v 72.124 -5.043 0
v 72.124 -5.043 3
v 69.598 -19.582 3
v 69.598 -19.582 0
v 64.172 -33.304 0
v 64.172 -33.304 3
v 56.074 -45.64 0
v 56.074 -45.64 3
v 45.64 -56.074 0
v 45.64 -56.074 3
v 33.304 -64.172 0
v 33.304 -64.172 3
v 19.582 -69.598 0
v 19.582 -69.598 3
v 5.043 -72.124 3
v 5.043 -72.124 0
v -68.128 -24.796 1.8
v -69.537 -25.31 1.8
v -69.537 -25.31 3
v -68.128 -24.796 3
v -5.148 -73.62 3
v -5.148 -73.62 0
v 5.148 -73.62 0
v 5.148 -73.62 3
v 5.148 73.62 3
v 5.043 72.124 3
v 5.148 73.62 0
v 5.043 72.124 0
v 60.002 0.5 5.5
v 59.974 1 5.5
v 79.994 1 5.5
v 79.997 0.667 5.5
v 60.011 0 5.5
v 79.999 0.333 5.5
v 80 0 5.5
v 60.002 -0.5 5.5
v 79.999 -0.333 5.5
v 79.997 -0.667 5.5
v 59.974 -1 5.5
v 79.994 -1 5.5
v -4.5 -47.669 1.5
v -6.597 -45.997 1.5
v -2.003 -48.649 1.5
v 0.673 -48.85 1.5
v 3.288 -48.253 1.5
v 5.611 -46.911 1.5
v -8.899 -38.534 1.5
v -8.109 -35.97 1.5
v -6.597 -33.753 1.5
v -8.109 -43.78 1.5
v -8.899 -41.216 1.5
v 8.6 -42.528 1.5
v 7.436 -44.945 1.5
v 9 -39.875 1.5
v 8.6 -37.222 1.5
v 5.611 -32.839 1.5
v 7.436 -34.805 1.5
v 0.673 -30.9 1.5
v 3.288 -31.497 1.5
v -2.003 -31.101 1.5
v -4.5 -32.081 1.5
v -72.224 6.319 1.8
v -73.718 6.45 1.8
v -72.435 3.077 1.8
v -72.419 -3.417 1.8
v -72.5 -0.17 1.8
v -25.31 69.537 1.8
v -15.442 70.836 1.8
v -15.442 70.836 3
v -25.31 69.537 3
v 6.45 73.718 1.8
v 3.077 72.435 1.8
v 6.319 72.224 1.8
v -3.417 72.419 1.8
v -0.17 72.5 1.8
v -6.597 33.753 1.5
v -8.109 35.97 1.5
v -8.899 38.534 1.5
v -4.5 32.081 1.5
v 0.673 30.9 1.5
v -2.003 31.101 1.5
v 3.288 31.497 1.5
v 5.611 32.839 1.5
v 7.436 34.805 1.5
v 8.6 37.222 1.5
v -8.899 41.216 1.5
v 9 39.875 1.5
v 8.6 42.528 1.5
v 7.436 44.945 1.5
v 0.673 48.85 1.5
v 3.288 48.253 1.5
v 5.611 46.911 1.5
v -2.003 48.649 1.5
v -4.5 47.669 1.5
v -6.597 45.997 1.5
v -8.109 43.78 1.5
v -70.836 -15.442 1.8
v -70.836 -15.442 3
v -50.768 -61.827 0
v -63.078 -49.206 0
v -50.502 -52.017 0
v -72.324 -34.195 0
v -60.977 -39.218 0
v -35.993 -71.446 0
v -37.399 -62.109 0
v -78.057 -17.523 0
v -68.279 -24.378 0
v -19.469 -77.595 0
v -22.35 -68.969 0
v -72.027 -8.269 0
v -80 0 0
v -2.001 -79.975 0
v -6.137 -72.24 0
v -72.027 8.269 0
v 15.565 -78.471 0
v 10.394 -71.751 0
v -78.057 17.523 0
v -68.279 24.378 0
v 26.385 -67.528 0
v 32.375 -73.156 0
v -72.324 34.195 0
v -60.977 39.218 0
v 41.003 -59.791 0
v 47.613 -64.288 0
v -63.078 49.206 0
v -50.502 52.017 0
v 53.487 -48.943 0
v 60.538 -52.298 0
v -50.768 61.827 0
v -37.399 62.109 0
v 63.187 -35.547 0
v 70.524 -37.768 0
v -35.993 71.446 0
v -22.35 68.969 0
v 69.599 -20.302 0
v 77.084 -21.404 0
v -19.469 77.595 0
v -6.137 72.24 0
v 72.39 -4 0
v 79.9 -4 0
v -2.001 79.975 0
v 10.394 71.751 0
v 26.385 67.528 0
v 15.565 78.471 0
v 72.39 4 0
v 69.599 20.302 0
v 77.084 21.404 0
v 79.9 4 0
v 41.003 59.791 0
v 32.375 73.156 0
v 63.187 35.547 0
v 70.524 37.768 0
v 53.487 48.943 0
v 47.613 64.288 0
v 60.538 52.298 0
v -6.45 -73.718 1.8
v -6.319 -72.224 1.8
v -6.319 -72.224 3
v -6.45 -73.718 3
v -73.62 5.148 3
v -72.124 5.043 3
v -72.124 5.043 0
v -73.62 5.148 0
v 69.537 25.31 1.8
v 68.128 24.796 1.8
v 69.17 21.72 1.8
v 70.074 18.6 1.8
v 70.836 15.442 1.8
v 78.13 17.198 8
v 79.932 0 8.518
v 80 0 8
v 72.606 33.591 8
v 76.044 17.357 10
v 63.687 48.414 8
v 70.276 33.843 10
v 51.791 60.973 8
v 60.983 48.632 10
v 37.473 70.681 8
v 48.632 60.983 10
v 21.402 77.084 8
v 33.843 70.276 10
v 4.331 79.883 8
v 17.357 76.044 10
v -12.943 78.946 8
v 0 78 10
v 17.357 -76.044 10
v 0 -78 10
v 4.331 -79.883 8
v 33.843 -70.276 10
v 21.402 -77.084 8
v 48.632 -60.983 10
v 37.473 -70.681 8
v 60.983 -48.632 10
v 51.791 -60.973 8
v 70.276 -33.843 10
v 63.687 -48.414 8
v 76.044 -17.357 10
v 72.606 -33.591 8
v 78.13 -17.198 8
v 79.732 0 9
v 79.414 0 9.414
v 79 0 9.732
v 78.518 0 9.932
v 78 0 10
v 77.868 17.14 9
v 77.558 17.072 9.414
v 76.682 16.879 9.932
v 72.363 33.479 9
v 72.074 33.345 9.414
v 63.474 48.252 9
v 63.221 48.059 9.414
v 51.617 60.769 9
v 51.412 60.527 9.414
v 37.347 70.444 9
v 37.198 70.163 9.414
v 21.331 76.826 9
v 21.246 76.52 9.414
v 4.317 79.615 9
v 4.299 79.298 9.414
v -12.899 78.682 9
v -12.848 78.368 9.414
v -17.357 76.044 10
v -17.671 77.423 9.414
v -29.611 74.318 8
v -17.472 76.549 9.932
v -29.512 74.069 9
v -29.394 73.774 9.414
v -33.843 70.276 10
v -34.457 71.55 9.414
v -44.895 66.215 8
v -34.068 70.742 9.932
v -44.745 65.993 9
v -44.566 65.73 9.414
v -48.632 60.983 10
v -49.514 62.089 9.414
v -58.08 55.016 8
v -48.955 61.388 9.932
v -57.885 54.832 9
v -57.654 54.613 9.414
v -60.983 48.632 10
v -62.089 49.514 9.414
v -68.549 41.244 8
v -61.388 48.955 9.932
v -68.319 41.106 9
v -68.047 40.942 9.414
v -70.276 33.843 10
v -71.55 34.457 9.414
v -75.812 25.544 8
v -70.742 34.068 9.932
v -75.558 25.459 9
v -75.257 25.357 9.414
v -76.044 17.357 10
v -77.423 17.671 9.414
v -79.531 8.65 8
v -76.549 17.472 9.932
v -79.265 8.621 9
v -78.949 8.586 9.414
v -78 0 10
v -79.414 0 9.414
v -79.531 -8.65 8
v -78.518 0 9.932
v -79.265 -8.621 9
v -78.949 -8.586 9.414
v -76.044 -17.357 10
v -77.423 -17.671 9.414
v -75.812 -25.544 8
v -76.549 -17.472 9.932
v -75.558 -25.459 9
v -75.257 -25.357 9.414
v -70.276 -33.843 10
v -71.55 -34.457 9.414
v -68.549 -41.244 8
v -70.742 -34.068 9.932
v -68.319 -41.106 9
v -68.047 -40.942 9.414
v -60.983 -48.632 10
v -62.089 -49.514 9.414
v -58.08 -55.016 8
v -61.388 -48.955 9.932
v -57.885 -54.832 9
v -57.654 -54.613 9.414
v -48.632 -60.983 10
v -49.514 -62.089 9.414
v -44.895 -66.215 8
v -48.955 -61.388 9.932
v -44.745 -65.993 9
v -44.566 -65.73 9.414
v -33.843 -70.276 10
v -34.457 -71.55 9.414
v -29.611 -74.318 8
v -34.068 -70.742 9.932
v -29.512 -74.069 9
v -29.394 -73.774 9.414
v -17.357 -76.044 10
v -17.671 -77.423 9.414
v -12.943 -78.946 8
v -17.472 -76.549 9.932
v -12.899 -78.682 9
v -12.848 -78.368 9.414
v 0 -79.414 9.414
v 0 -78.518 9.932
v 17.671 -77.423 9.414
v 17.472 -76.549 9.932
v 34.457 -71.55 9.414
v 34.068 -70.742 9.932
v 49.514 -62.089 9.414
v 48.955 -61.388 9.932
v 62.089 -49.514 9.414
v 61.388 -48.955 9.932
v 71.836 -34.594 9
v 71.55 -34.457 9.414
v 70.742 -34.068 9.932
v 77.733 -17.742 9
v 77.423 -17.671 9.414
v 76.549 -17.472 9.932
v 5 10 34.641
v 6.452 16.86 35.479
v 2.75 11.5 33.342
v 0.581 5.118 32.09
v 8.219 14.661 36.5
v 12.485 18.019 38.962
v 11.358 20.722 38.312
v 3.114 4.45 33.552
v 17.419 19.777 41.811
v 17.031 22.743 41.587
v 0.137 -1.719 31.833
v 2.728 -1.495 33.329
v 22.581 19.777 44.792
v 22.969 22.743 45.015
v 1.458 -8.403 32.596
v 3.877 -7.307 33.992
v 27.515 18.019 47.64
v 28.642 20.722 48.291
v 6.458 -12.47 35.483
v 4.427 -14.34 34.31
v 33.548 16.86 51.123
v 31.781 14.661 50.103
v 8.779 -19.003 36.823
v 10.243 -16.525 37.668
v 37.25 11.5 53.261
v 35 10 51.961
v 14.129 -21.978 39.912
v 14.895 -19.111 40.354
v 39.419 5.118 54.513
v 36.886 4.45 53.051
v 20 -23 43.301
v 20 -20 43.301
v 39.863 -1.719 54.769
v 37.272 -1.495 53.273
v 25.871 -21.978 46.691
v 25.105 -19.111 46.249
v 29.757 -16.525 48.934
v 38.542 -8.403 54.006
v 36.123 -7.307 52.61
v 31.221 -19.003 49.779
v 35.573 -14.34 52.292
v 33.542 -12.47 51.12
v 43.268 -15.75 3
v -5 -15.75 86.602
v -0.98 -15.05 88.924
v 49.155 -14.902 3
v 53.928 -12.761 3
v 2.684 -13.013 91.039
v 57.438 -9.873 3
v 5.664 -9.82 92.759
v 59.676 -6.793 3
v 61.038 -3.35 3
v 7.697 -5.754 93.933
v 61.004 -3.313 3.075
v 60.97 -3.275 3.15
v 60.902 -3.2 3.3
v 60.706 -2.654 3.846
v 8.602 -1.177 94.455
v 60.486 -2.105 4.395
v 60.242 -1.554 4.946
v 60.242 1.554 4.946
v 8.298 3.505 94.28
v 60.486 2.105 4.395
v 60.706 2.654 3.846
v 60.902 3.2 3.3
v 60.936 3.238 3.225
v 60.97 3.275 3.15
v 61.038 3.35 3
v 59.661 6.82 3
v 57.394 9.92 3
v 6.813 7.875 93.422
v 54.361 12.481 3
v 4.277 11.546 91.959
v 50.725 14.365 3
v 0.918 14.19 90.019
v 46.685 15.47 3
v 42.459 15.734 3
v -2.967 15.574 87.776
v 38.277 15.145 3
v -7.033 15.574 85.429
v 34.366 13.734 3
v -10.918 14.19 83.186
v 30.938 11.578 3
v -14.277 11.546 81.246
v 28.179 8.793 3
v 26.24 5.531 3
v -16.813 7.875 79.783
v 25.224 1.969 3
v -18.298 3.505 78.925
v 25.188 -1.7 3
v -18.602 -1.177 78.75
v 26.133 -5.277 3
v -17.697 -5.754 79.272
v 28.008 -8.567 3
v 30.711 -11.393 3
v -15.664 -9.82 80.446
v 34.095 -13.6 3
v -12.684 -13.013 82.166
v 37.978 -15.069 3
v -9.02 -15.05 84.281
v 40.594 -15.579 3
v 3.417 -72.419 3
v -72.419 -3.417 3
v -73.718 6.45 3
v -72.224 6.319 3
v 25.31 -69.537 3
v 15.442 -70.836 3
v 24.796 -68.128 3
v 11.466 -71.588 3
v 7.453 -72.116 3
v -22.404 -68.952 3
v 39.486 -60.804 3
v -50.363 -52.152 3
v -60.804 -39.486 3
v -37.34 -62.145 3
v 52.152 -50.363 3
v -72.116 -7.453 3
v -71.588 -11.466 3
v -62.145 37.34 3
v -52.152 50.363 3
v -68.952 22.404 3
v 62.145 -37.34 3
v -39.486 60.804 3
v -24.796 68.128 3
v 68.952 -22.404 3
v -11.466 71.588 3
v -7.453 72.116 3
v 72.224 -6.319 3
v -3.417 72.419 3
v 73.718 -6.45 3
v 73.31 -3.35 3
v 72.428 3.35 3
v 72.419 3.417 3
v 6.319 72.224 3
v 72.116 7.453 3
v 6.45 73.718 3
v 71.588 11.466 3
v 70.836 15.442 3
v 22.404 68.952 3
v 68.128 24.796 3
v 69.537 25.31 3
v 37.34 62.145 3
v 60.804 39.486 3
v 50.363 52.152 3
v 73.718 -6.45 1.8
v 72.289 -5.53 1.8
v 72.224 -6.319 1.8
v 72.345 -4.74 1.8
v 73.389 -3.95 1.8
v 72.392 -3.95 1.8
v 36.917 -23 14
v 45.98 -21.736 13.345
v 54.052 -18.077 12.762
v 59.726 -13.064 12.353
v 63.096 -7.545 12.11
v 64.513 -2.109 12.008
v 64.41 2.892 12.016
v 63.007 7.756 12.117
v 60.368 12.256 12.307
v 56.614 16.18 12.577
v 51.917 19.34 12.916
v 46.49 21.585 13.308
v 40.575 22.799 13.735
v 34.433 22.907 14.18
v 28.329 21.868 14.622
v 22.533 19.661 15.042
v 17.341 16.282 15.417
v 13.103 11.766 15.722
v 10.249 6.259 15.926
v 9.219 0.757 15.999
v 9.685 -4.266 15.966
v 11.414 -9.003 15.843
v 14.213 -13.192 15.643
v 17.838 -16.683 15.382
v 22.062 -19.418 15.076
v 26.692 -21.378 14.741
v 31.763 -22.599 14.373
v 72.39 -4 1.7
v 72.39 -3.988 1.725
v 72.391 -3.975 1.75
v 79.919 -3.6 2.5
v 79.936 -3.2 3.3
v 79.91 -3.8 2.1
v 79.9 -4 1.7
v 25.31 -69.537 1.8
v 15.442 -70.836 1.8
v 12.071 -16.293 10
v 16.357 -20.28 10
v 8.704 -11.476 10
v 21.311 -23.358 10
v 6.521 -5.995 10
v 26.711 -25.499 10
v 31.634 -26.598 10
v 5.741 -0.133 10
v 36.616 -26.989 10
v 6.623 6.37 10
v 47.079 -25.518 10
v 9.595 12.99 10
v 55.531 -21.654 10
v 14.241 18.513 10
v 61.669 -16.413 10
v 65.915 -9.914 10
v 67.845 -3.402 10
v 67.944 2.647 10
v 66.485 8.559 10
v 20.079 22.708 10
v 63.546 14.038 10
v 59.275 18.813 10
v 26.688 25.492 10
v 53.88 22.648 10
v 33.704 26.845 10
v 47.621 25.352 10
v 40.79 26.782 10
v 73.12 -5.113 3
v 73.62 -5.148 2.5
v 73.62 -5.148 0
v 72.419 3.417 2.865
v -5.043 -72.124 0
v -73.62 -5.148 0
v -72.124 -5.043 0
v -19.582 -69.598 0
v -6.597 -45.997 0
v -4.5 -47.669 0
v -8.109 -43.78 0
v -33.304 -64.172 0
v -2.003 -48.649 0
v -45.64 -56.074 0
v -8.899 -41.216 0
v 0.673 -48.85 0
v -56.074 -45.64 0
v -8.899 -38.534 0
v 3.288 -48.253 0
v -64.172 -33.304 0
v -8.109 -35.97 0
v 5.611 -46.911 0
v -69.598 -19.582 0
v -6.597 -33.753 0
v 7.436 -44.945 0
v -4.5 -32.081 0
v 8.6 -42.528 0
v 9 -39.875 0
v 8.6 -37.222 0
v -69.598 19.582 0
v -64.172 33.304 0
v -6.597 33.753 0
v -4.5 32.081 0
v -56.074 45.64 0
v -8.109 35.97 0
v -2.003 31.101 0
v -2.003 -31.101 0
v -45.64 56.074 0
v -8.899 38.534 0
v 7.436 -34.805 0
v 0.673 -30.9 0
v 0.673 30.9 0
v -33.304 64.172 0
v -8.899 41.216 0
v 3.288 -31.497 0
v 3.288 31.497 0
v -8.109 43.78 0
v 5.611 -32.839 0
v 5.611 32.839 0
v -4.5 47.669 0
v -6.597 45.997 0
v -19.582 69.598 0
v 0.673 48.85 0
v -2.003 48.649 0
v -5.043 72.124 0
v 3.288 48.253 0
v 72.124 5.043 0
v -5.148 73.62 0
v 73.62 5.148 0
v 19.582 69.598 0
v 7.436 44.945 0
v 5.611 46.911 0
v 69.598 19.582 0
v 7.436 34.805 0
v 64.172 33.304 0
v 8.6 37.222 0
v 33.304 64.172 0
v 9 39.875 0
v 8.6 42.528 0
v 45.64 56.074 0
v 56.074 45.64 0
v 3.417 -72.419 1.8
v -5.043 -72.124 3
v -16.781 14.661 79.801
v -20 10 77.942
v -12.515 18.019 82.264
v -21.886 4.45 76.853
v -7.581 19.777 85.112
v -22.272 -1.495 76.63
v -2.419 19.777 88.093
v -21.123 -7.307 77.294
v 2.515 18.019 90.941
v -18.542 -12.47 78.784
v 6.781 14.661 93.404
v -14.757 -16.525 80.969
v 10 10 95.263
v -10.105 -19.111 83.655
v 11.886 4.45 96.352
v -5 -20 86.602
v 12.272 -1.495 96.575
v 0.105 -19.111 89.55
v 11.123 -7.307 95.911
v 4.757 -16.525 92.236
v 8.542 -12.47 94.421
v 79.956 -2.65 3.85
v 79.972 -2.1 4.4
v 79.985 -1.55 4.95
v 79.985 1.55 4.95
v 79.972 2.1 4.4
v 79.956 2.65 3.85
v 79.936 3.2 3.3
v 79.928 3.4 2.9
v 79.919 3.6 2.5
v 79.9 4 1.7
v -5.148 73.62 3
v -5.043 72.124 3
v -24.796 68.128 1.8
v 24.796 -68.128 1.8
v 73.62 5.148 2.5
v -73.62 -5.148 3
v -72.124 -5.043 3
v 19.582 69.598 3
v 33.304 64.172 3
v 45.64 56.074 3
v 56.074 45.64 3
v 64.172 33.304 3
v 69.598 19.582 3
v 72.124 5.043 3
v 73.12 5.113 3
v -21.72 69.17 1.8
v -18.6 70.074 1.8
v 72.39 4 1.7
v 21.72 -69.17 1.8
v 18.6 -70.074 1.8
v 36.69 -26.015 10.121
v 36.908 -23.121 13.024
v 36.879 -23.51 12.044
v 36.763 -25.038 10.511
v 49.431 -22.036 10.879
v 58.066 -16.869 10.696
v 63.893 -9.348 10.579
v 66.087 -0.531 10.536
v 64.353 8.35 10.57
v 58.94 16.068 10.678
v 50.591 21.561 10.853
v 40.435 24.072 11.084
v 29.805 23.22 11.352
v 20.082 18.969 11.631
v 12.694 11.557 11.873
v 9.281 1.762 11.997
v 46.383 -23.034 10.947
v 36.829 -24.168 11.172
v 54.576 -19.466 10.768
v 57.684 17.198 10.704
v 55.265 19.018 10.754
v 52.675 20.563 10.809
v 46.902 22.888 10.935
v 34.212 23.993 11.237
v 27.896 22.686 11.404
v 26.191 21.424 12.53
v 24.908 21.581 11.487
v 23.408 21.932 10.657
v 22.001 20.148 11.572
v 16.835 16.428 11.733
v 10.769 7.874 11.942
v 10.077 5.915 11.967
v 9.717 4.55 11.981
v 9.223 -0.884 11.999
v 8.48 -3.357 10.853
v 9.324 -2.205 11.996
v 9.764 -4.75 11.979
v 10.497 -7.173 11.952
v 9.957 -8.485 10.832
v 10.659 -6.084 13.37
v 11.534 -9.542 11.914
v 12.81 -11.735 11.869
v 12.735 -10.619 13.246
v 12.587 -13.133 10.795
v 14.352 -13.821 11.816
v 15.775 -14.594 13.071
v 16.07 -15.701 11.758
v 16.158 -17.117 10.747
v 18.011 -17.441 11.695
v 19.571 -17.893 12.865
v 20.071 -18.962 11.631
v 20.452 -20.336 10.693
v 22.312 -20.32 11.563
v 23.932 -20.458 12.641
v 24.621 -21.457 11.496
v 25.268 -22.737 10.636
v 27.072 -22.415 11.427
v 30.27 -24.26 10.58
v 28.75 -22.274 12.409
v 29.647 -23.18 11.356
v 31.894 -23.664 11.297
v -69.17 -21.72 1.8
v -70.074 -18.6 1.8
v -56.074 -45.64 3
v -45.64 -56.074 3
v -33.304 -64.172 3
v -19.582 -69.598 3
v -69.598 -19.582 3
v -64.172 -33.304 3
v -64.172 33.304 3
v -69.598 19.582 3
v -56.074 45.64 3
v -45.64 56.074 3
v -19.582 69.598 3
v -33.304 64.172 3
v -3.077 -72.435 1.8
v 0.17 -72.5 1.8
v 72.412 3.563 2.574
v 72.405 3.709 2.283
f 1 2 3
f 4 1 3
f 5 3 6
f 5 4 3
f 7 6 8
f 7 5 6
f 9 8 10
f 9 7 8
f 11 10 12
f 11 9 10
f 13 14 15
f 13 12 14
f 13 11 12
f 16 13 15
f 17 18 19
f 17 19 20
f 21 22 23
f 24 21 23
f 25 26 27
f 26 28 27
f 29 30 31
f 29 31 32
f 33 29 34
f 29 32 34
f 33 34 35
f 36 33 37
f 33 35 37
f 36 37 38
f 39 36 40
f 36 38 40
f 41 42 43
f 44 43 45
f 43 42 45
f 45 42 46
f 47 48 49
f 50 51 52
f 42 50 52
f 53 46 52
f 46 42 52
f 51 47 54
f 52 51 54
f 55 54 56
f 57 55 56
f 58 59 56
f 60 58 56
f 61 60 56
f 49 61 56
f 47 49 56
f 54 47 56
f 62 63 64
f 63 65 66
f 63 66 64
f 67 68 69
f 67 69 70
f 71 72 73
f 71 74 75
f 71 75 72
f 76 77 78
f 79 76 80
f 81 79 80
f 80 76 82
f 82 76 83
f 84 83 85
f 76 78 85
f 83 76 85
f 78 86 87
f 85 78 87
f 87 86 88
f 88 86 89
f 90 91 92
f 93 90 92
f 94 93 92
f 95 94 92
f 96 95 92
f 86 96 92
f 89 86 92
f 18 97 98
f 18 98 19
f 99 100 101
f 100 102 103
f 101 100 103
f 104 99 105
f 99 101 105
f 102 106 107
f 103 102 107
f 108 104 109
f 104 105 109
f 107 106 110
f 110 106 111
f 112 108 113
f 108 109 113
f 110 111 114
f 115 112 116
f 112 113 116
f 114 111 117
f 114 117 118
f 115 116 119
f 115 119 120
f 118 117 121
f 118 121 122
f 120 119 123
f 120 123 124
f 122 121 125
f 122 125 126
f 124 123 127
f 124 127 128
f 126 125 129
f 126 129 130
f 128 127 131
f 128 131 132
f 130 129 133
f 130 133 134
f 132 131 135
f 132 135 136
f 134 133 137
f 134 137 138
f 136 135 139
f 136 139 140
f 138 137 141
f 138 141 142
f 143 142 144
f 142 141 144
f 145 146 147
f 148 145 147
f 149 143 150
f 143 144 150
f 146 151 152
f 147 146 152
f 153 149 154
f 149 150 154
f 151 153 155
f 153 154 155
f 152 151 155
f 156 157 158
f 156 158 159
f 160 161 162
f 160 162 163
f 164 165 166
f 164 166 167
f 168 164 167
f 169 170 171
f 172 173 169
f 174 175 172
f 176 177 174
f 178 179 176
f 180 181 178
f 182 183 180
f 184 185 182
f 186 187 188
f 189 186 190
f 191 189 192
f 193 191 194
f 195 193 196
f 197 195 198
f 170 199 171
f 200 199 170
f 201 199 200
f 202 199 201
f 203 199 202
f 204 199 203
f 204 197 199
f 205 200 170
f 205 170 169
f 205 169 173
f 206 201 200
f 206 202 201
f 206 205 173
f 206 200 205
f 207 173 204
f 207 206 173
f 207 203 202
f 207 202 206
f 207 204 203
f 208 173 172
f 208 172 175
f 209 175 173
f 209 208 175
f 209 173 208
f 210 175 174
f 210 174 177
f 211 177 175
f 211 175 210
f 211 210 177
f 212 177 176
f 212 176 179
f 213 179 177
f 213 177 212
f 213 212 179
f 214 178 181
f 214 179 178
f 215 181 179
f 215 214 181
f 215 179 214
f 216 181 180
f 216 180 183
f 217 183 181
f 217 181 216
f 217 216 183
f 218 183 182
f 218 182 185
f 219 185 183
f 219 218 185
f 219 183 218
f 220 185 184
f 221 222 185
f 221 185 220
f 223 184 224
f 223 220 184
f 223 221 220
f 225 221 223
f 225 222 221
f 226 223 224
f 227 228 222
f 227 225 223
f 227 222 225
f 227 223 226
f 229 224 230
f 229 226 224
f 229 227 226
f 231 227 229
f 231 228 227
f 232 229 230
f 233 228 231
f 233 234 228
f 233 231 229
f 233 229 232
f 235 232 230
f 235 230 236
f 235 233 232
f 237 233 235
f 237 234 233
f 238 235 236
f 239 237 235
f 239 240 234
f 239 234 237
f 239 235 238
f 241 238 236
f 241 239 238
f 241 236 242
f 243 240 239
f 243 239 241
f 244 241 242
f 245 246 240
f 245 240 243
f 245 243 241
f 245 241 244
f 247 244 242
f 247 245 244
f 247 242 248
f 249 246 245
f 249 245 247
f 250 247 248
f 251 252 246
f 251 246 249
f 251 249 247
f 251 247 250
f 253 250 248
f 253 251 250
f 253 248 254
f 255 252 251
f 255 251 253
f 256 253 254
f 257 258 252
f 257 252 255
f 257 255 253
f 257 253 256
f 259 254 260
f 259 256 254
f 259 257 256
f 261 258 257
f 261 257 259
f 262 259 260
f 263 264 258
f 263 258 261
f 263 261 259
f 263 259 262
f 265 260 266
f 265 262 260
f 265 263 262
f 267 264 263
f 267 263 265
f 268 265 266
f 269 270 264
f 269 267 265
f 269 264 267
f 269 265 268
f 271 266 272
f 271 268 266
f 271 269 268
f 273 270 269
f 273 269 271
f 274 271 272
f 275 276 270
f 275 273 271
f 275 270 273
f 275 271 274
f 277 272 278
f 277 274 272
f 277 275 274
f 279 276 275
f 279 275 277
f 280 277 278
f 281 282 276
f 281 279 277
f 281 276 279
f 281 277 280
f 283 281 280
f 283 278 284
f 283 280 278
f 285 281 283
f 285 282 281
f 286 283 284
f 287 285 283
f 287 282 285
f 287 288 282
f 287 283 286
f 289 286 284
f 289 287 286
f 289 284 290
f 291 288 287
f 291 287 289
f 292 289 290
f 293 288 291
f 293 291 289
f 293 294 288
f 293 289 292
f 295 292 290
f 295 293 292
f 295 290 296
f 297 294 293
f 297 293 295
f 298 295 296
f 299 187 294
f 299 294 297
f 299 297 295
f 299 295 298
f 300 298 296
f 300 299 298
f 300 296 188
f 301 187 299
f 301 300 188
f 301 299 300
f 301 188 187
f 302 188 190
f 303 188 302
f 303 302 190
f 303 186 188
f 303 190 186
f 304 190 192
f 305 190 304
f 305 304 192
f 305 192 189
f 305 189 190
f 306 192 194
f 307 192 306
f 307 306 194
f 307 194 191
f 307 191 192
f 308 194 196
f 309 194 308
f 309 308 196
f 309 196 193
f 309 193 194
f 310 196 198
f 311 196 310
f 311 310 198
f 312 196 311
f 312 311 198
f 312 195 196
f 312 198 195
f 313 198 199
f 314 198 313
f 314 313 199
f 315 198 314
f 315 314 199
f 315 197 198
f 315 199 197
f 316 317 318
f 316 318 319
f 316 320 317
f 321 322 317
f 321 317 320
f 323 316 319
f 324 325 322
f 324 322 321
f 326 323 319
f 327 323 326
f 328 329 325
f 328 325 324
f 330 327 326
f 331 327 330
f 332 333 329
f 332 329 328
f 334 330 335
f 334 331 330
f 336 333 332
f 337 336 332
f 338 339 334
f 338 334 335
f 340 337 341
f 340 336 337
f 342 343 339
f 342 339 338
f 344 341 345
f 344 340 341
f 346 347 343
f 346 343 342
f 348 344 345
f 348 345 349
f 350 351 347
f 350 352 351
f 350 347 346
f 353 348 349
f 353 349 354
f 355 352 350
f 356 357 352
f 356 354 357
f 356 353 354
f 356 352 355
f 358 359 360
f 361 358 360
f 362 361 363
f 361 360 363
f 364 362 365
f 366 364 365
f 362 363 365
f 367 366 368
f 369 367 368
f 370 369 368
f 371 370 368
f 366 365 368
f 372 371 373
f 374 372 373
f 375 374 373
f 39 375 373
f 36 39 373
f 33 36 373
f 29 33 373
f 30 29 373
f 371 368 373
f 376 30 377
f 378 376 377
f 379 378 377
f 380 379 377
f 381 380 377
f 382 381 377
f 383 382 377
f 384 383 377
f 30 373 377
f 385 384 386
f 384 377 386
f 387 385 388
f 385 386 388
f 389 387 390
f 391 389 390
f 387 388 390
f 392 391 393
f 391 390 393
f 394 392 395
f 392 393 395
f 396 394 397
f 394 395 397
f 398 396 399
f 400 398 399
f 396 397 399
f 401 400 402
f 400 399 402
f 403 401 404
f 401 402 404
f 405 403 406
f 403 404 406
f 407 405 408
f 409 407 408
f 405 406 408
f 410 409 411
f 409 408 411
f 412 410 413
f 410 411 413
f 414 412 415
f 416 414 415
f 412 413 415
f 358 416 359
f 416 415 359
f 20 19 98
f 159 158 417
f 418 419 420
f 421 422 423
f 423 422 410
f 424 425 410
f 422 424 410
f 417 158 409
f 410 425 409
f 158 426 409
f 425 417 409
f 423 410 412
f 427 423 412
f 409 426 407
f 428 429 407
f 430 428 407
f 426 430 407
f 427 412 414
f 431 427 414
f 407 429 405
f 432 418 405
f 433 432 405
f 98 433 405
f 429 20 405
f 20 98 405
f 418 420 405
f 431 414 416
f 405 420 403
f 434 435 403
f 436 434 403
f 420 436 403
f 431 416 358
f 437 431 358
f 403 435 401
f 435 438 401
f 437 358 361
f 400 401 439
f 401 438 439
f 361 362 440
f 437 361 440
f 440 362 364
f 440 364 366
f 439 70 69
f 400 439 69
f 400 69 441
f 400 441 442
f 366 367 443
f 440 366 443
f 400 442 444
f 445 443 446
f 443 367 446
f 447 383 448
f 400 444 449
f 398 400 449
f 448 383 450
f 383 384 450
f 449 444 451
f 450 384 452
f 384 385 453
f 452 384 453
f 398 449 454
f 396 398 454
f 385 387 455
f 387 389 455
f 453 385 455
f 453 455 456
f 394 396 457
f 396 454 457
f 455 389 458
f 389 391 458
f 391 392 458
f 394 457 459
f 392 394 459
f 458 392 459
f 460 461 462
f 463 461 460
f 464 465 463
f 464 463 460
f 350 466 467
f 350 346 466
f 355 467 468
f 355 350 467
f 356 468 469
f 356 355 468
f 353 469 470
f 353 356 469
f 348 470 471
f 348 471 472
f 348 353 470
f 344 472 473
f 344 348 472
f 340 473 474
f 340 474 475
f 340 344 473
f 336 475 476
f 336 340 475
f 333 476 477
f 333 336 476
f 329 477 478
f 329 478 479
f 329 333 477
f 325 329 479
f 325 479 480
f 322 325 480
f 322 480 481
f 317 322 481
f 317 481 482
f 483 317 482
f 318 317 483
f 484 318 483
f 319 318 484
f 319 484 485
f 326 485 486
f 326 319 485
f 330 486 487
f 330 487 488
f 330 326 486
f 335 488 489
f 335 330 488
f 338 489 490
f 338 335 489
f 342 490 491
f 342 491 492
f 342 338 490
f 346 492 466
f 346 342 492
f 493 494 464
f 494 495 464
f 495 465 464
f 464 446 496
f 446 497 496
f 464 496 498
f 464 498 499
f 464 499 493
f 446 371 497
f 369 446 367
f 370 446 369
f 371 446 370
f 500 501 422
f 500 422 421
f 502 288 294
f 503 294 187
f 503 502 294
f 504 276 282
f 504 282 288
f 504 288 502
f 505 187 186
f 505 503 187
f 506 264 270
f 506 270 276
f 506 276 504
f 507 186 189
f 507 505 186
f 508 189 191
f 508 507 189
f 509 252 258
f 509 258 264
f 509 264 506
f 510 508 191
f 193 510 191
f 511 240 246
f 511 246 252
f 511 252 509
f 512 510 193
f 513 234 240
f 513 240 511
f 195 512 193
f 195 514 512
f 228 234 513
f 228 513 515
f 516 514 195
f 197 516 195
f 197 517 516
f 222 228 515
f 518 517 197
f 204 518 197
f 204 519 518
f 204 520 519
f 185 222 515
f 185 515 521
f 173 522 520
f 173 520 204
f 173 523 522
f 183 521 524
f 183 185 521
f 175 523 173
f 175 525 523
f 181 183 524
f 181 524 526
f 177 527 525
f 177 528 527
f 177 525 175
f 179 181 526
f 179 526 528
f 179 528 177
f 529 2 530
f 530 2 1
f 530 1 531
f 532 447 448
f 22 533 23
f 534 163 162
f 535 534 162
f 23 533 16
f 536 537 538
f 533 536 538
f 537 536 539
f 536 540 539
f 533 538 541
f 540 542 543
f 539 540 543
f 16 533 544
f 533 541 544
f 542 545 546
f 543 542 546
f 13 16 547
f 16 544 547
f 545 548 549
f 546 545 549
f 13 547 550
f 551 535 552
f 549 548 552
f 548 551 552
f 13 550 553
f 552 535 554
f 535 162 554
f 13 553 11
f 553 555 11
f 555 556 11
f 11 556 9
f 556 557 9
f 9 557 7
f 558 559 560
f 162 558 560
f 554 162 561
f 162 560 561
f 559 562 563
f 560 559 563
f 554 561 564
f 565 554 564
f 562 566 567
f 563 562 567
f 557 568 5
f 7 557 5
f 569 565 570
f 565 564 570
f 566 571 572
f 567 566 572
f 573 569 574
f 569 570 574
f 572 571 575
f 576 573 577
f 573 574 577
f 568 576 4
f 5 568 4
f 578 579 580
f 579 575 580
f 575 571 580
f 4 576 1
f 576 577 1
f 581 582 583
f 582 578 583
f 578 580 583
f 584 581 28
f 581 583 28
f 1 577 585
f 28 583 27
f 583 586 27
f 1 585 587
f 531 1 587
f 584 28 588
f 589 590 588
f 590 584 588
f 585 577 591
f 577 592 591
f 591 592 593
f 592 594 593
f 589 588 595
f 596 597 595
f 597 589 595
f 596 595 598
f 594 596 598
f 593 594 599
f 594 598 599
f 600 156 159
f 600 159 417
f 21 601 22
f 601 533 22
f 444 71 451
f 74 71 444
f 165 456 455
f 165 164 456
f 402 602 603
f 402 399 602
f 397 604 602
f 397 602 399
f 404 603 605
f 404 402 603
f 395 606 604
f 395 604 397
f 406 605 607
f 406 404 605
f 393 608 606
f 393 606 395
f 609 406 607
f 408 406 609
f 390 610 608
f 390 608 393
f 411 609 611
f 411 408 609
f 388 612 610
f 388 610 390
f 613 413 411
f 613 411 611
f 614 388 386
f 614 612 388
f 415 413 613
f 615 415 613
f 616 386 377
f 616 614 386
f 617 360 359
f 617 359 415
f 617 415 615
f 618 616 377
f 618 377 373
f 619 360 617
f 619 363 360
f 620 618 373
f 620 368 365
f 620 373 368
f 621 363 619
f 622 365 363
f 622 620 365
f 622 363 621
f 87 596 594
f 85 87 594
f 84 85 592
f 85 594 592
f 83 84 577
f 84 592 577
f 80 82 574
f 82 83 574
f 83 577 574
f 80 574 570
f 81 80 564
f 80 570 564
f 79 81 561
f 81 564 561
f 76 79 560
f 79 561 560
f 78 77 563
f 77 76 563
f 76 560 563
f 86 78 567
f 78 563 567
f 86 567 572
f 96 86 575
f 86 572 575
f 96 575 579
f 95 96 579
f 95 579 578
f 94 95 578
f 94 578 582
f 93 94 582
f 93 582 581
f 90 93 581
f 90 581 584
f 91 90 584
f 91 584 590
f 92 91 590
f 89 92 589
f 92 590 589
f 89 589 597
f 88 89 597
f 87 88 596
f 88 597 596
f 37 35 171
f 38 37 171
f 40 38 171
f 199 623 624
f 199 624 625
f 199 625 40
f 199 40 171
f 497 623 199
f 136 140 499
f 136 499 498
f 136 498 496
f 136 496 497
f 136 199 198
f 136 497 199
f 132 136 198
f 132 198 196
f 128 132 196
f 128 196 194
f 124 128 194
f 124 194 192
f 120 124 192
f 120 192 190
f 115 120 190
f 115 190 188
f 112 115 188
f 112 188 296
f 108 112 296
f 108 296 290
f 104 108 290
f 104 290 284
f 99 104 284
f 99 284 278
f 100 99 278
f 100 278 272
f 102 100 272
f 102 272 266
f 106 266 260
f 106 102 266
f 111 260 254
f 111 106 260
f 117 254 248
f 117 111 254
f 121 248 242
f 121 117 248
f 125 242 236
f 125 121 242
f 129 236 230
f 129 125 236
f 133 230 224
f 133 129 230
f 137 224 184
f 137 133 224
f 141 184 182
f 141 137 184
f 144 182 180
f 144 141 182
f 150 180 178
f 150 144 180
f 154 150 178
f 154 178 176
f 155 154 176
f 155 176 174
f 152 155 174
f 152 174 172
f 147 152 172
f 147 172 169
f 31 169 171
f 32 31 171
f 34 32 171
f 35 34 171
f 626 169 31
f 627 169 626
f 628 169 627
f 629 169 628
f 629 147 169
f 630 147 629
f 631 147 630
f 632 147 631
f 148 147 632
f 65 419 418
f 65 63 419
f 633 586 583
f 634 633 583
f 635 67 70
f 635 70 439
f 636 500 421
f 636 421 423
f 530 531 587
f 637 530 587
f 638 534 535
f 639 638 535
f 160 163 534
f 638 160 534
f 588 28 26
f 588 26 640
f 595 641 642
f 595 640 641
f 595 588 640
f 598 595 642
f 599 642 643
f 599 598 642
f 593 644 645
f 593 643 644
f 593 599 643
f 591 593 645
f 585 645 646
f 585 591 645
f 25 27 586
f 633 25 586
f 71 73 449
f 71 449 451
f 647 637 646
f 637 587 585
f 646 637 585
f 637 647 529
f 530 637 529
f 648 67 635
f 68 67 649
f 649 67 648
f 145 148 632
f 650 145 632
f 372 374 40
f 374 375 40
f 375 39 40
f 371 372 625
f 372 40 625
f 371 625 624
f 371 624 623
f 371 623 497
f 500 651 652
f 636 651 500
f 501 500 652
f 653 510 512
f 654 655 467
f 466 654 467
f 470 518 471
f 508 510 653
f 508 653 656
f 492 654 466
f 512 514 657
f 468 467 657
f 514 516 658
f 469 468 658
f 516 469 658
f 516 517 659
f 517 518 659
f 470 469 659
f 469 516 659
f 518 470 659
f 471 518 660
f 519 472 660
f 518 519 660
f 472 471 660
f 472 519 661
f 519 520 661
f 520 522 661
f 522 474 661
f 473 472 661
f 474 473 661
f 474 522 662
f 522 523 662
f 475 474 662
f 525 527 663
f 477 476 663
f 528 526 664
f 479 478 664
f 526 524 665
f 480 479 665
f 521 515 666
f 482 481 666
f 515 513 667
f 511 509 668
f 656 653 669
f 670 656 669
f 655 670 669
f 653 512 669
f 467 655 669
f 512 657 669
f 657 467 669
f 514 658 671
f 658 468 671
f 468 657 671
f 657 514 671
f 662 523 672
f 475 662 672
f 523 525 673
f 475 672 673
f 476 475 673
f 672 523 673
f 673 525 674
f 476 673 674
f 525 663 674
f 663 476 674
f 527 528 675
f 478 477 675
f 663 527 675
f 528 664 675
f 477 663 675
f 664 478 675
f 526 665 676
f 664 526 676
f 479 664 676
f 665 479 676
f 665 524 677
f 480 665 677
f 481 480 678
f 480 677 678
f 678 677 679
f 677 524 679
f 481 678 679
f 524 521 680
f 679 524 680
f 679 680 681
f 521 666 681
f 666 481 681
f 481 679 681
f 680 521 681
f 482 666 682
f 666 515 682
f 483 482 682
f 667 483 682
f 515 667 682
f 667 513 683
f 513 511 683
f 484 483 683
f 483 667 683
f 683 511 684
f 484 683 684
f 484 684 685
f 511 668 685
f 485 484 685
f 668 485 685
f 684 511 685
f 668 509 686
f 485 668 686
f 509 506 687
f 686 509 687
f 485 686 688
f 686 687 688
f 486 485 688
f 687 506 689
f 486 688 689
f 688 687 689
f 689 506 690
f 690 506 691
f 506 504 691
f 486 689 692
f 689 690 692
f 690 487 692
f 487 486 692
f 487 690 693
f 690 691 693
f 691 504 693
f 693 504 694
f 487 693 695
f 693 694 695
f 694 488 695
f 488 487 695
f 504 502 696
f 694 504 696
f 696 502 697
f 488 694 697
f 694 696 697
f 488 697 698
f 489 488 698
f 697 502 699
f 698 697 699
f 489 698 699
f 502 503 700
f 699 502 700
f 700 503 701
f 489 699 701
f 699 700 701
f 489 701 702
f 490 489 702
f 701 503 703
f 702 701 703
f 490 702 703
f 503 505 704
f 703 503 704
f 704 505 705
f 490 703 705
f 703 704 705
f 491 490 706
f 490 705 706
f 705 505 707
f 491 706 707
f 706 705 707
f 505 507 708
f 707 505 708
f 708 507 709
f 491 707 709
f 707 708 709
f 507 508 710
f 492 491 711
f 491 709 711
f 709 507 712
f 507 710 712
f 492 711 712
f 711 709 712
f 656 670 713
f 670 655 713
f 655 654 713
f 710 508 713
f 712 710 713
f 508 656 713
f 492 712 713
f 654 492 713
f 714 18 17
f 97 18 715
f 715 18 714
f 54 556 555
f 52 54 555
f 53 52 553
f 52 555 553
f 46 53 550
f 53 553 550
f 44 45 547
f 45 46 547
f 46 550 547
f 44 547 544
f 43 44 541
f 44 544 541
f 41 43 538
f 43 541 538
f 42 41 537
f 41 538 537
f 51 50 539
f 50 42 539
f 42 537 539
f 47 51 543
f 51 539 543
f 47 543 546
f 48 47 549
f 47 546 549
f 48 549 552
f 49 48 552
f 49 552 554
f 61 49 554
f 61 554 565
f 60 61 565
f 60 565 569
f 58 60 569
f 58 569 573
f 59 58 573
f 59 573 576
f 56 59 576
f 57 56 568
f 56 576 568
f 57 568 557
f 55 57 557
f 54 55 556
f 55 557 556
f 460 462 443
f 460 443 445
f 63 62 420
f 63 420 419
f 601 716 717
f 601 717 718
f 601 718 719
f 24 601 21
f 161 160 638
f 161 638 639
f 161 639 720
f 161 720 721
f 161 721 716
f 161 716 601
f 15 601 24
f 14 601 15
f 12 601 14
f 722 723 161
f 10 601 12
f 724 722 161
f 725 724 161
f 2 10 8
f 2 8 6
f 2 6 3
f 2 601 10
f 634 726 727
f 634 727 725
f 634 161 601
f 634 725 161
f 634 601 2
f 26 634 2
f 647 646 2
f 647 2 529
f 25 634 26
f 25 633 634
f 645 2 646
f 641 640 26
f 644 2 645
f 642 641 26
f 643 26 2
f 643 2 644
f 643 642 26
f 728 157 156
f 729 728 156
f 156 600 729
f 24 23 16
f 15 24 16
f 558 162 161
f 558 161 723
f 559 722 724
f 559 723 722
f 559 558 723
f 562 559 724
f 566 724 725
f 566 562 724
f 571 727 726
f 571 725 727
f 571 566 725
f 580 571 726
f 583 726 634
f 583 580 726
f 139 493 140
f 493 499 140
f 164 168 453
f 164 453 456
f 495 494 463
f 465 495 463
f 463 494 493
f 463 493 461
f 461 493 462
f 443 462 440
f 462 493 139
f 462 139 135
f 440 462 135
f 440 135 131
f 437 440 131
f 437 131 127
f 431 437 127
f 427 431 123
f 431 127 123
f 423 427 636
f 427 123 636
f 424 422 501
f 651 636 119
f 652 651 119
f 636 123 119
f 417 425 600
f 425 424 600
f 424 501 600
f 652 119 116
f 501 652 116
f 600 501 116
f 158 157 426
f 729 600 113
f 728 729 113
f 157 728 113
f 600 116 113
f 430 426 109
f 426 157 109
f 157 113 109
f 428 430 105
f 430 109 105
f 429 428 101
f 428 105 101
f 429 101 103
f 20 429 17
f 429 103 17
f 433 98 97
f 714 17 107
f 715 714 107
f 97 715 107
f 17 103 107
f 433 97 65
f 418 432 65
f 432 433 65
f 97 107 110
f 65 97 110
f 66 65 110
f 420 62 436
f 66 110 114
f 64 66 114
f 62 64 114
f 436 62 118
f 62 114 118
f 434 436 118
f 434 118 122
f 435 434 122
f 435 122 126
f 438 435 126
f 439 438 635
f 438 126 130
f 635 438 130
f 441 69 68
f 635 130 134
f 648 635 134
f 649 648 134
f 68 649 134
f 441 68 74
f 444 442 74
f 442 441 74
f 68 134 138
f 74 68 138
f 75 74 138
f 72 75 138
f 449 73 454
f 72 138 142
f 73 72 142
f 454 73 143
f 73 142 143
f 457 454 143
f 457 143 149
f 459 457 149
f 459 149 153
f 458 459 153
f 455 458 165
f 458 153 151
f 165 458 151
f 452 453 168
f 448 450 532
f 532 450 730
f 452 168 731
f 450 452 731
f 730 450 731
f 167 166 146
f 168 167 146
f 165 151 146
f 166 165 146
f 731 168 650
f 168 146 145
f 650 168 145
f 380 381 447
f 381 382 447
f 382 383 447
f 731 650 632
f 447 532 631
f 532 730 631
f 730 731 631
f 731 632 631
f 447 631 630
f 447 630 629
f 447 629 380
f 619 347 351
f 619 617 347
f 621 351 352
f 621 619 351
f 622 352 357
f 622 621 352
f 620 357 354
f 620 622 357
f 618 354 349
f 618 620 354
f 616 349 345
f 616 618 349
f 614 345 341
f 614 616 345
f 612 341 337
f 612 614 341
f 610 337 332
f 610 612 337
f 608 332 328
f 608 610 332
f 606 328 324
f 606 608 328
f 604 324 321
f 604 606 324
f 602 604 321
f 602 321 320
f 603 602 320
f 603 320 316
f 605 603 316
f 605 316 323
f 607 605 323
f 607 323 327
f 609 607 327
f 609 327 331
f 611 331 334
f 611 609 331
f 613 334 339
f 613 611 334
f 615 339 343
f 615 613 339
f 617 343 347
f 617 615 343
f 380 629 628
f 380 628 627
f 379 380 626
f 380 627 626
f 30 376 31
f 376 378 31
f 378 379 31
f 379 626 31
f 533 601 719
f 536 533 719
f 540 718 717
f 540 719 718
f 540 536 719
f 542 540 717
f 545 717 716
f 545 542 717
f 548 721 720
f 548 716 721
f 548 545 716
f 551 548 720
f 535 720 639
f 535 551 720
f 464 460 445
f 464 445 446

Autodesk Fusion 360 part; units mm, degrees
sketch "Skizze1" plane through (0, 0, 0) normal (0, 0, 1) x (1, 0, 0)
  circle A0 centre (0, 0) radius 80
extrude "Extrusion1" add sketch "Skizze1" along normal blind 10 makes body 1
fillet "Abrundung1" radius 2 1 edges at (-74.5862, -28.9292, 10) on bodies 1
sketch "Skizze2" plane through (0, 0, 0) normal (0, 1, 0) x (1, 0, 0)
  line L0 (45, 0) -> (-5, -86.6025) construction
ref_plane "Arbeitsebene1" through (-5, 0, 86.6025) normal (-0.5, 0, 0.866) x (0, -1, 0)
sketch "Skizze3" plane through (-5, 0, 86.6025) normal (-0.5, 0, 0.866) x (0, -1, 0)
  circle A0 centre (0, 0) radius 23
  circle A1 centre (0, 0) radius 20
extrude "Extrusion5" add sketch "Skizze3" against normal blind 110 separate body contours A0 | A1 makes body 2
combine "Kombinieren1" operation add target body 1 tool bodies 2
extrude "Extrusion6" cut sketch "Skizze3" against normal blind 50 bodies 1
fillet "Abrundung2" radius 4 3 edges at (65.7846, 0, 10) (-74.5862, -28.9292, 8) (-72.7215, 28.206, 10) on bodies 1
sketch "Skizze4" plane through (-5, 0, 86.6025) normal (-0.5, 0, 0.866) x (0, -1, 0)
  circle A0 centre (0, 0) radius 15.75
extrude "Extrusion7" cut sketch "Skizze4" against normal blind 110 bodies 1
sketch "Skizze5" plane through (0, 0, 0) normal (0, 0, 1) x (1, 0, 0)
  circle A0 centre (0, 0) radius 160
extrude "Extrusion8" cut sketch "Skizze5" against normal blind 110 bodies 1
sketch "Skizze6" plane through (0, 0, 0) normal (0, 0, 1) x (1, 0, 0)
  line L0 (45, 0) -> (85, 0)
ref_plane "Arbeitsebene2" through (45, 0, 0) normal (1, 0, 0) x (0, 1, 0)
sketch "Skizze7" plane through (45, 0, 0) normal (1, 0, 0) x (0, 1, 0)
  line L0 (-4, 0) -> (-4, 1.7)
  line L1 (-4, 1.7) -> (-3.2, 3.3)
  line L2 (-3.2, 3.3) -> (-1, 5.5)
  line L3 (-1, 5.5) -> (1, 5.5)
  line L4 (1, 5.5) -> (3.2, 3.3)
  line L5 (3.2, 3.3) -> (4, 1.7)
  line L6 (4, 1.7) -> (4, 0)
  line L7 (4, 0) -> (-4, 0)
sweep "Sweeping1" cut profiles "Skizze7" path "Skizze6" along L0 section 1 bodies 1
sketch "Skizze8" plane through (0, 0, 0) normal (0, 0, 1) x (1, 0, 0)
  circle A0 centre (0, 0) radius 72.5
extrude "Extrusion9" cut sketch "Skizze8" along normal blind 3 bodies 1
sketch "Skizze9" plane through (0, 0, 0) normal (0, 0, 1) x (1, 0, 0)
  line L0 (72.2241, -6.3188) -> (73.7184, -6.4495)
  line L1 (73.7184, -6.4495) -> (69.5373, 25.3095)
  line L2 (69.5373, 25.3095) -> (68.1277, 24.7965)
  line L3 (68.1277, 24.7965) -> (72.2241, -6.3188)
  line L4 (6.3188, 72.2241) -> (6.4495, 73.7184)
  line L5 (6.4495, 73.7184) -> (-25.3095, 69.5373)
  line L6 (-25.3095, 69.5373) -> (-24.7965, 68.1277)
  line L7 (-24.7965, 68.1277) -> (6.3188, 72.2241)
  line L8 (-72.2241, 6.3188) -> (-73.7184, 6.4495)
  line L9 (-73.7184, 6.4495) -> (-69.5373, -25.3095)
  line L10 (-69.5373, -25.3095) -> (-68.1277, -24.7965)
  line L11 (-68.1277, -24.7965) -> (-72.2241, 6.3188)
  line L12 (-6.3188, -72.2241) -> (-6.4495, -73.7184)
  line L13 (-6.4495, -73.7184) -> (25.3095, -69.5373)
  line L14 (25.3095, -69.5373) -> (24.7965, -68.1277)
  line L15 (24.7965, -68.1277) -> (-6.3188, -72.2241)
extrude "Extrusion10" cut sketch "Skizze9" along normal blind 1.2 from surface at 1.8 bodies 1
sketch "Skizze10" plane through (0, 0, 0) normal (0, 0, 1) x (1, 0, 0)
  circle A0 centre (0, 0) radius 72.3
  line L0 (71.1263, -4.9736) -> (73.6202, -5.148)
  line L1 (73.6202, -5.148) -> (73.6202, 5.148)
  line L2 (73.6202, 5.148) -> (71.1263, 4.9736)
  line L3 (71.1263, 4.9736) -> (71.1263, -4.9736)
  line L4 (4.9736, 71.1263) -> (5.148, 73.6202)
  line L5 (5.148, 73.6202) -> (-5.148, 73.6202)
  line L6 (-5.148, 73.6202) -> (-4.9736, 71.1263)
  line L7 (-4.9736, 71.1263) -> (4.9736, 71.1263)
  line L8 (-71.1263, 4.9736) -> (-73.6202, 5.148)
  line L9 (-73.6202, 5.148) -> (-73.6202, -5.148)
  line L10 (-73.6202, -5.148) -> (-71.1263, -4.9736)
  line L11 (-71.1263, -4.9736) -> (-71.1263, 4.9736)
  line L12 (-4.9736, -71.1263) -> (-5.148, -73.6202)
  line L13 (-5.148, -73.6202) -> (5.148, -73.6202)
  line L14 (5.148, -73.6202) -> (4.9736, -71.1263)
  line L15 (4.9736, -71.1263) -> (-4.9736, -71.1263)
extrude "Extrusion11" add sketch "Skizze10" along normal blind 3 separate body makes body 3
sketch "Skizze11" plane through (0, 0, 0) normal (0, 0, 1) x (1, 0, 0)
  circle A0 centre (0, 39.875) radius 9
  circle A1 centre (0, -39.875) radius 9
extrude "Extrusion12" cut sketch "Skizze11" along normal blind 1.5 bodies 3
chamfer "Fase1" distance 0.5 angle 45 1 edges at (73.6202, 0, 3) on bodies 3
equation "base_plate_diameter = 160 mm"
equation "base_plate_height = 10 mm"
equation "base_plate_rounding = 2 mm"
equation "leg_outer_diameter = 46 mm"
equation "ring_inner_diameter = 40 mm"
equation "ring_extrude_depth = 50 mm"
equation "hole_inner_diameter = 31.5 mm"
equation "leg_length = 100 mm"
equation "leg_angle = 120 deg"
equation "leg_offset = 45 mm"
equation "leg_plate_rounding = 4 mm"
equation "cable_channel_width = 8 mm"
equation "cable_channel_depth = 5.5 mm"
equation "cable_channel_vertical_height = 2.5 mm"
equation "cable_channel_edge_chamfer = 0.8 mm"
equation "cover_plate_diameter = 145 mm"
equation "cover_plate_thickness = 3 mm"
equation "finger_grip_diameter = 18 mm"
equation "finger_grip_depth = 1.5 mm"
equation "clamp_recess_width = 22 mm"
equation "clamp_recess_length = 12 mm"
equation "clamp_recess_depth = 2.5 mm"
equation "strain_relief_screw_diameter = 2.6 mm"
equation "strain_relief_screw_depth = 6 mm"
equation "d25 = base_plate_height"
equation "d28 = base_plate_rounding"
equation "d41 = leg_plate_rounding"
equation "d53 = cover_plate_thickness"
equation "d58 = cover_plate_thickness"
equation "d60 = finger_grip_depth"
